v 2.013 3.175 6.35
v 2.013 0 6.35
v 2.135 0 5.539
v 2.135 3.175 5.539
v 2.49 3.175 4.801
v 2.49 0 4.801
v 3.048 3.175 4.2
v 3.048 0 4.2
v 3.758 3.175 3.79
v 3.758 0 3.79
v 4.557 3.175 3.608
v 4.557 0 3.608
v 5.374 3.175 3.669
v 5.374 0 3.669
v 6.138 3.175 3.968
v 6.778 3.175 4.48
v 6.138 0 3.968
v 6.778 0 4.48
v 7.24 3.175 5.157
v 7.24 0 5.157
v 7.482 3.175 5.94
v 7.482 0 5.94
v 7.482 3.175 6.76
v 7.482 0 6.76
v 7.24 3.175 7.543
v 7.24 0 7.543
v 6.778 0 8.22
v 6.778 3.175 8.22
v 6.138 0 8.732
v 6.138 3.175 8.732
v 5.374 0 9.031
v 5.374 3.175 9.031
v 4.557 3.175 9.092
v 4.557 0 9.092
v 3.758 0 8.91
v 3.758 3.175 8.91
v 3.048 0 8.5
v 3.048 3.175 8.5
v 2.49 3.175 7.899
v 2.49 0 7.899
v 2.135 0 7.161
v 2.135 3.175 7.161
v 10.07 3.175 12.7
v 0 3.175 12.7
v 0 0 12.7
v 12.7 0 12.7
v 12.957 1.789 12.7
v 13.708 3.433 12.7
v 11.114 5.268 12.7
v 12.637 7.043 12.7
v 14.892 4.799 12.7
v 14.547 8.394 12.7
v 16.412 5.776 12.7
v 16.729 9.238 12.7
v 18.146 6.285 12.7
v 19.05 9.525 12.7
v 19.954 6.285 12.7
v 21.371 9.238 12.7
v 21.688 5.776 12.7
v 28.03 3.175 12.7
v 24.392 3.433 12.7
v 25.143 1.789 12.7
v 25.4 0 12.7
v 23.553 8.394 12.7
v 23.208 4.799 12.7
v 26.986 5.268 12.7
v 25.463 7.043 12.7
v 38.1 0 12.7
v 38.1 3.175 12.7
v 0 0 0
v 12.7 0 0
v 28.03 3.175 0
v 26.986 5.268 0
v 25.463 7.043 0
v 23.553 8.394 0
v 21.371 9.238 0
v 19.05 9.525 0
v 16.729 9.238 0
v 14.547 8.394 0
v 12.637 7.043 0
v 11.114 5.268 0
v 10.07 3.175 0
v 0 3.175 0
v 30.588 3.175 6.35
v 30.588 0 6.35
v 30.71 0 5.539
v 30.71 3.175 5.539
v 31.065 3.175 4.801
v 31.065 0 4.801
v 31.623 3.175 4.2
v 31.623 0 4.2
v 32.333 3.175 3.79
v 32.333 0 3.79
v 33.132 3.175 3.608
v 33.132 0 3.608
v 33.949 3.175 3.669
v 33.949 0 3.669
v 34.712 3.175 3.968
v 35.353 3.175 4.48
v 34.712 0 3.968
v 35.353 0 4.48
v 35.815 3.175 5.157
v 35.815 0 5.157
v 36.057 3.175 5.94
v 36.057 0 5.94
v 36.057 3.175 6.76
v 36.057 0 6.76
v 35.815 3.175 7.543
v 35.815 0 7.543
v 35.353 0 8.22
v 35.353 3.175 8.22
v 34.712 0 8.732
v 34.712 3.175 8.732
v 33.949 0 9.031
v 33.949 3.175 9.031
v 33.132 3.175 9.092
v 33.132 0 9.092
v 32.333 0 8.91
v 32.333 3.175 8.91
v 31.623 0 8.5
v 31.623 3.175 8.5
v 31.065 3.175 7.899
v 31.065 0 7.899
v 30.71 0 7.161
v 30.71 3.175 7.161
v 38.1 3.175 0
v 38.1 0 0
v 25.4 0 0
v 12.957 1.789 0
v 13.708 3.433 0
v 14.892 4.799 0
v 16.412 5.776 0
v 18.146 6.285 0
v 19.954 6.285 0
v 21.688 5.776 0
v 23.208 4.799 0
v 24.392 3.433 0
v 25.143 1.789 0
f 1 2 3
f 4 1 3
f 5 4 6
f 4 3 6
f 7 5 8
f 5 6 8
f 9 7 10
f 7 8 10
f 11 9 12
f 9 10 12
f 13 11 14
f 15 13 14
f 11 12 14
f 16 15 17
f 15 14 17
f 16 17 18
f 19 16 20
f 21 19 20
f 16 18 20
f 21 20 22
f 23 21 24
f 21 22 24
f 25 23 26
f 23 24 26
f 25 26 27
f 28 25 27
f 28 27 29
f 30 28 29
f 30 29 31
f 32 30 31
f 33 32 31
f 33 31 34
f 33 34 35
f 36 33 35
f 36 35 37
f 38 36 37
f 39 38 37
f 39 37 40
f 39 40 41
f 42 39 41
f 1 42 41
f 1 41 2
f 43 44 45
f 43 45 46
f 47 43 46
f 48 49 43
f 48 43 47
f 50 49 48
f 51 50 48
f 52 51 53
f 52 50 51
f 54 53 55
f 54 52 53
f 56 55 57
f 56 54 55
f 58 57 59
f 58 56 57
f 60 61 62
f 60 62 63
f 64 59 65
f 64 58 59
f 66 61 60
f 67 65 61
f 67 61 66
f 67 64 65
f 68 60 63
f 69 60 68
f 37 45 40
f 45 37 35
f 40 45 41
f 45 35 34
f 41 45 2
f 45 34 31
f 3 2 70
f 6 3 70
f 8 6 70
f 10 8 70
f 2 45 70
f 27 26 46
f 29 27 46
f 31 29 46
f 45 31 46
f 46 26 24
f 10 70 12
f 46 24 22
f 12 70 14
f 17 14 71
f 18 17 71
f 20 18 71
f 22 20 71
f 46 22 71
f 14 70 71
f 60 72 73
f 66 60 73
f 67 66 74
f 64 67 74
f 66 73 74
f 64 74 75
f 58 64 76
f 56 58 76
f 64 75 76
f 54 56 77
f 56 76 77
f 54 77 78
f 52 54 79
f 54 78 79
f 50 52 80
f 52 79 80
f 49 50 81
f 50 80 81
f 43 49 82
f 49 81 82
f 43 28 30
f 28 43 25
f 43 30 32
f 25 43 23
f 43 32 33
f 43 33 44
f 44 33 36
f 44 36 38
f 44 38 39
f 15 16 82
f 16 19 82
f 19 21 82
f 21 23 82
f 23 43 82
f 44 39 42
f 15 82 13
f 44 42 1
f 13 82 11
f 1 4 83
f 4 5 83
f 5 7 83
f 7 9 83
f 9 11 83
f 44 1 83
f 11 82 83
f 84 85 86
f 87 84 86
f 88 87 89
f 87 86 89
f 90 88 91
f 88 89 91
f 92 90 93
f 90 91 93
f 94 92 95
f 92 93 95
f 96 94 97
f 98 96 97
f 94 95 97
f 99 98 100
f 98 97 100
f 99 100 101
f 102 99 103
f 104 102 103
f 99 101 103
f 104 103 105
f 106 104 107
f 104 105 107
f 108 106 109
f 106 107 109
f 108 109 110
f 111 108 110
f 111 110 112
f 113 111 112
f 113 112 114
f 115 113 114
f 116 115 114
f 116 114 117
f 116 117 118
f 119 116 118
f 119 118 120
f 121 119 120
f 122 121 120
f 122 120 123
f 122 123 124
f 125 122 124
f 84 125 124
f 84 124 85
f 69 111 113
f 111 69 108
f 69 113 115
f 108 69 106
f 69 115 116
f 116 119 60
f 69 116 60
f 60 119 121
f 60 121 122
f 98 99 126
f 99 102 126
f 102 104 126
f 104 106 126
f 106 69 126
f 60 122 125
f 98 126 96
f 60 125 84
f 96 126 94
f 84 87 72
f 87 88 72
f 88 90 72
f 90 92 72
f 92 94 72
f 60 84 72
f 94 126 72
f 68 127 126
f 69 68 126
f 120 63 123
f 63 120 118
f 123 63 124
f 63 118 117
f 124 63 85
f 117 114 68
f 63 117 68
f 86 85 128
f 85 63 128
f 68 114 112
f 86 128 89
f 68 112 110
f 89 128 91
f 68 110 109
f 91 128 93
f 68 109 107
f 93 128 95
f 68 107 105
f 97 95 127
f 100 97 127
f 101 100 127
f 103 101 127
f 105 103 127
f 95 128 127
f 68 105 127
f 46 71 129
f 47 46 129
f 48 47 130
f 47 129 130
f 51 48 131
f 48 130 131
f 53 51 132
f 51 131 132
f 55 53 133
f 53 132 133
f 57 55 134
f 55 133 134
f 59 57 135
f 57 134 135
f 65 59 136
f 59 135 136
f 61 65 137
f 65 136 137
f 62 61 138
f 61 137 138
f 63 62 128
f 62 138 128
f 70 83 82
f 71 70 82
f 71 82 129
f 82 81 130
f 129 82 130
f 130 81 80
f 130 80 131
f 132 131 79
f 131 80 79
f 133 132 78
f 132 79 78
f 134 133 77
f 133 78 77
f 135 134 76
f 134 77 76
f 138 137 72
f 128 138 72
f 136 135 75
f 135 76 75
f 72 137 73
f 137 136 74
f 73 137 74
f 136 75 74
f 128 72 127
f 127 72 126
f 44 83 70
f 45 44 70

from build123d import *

# Parameters (mm, degrees)
BOSS_EXTRUDE1_DEPTH  = 12.7
M5_CLEARANCE_HOLE2_D = 5.5


with BuildPart() as part:
    # Sketch1 → Boss-Extrude1 (new body)
    with BuildSketch(Plane.XY):
        with BuildLine():
            Line((25.4, 0), (38.1, 0))
            Line((38.1, 0), (38.1, 3.175))
            Line((38.1, 3.175), (28.030256121, 3.175))
            ThreePointArc((28.030256121, 3.175), (19.05, 9.525), (10.069743879, 3.175))
            Line((10.069743879, 3.175), (0, 3.175))
            Line((0, 3.175), (0, 0))
            Line((0, 0), (12.7, 0))
            ThreePointArc((12.7, 0), (19.05, 6.35), (25.4, 0))
        make_face()
    extrude(amount=BOSS_EXTRUDE1_DEPTH)

    # M5 Clearance Hole2 (through all)
    with Locations(Plane(origin=(0, 3.175, 0), x_dir=(1, 0, 0), z_dir=(0, 1, 0))):
        with Locations((4.7625, -6.35), (33.3375, -6.35)):
            Hole(M5_CLEARANCE_HOLE2_D / 2)


solid = part.part
